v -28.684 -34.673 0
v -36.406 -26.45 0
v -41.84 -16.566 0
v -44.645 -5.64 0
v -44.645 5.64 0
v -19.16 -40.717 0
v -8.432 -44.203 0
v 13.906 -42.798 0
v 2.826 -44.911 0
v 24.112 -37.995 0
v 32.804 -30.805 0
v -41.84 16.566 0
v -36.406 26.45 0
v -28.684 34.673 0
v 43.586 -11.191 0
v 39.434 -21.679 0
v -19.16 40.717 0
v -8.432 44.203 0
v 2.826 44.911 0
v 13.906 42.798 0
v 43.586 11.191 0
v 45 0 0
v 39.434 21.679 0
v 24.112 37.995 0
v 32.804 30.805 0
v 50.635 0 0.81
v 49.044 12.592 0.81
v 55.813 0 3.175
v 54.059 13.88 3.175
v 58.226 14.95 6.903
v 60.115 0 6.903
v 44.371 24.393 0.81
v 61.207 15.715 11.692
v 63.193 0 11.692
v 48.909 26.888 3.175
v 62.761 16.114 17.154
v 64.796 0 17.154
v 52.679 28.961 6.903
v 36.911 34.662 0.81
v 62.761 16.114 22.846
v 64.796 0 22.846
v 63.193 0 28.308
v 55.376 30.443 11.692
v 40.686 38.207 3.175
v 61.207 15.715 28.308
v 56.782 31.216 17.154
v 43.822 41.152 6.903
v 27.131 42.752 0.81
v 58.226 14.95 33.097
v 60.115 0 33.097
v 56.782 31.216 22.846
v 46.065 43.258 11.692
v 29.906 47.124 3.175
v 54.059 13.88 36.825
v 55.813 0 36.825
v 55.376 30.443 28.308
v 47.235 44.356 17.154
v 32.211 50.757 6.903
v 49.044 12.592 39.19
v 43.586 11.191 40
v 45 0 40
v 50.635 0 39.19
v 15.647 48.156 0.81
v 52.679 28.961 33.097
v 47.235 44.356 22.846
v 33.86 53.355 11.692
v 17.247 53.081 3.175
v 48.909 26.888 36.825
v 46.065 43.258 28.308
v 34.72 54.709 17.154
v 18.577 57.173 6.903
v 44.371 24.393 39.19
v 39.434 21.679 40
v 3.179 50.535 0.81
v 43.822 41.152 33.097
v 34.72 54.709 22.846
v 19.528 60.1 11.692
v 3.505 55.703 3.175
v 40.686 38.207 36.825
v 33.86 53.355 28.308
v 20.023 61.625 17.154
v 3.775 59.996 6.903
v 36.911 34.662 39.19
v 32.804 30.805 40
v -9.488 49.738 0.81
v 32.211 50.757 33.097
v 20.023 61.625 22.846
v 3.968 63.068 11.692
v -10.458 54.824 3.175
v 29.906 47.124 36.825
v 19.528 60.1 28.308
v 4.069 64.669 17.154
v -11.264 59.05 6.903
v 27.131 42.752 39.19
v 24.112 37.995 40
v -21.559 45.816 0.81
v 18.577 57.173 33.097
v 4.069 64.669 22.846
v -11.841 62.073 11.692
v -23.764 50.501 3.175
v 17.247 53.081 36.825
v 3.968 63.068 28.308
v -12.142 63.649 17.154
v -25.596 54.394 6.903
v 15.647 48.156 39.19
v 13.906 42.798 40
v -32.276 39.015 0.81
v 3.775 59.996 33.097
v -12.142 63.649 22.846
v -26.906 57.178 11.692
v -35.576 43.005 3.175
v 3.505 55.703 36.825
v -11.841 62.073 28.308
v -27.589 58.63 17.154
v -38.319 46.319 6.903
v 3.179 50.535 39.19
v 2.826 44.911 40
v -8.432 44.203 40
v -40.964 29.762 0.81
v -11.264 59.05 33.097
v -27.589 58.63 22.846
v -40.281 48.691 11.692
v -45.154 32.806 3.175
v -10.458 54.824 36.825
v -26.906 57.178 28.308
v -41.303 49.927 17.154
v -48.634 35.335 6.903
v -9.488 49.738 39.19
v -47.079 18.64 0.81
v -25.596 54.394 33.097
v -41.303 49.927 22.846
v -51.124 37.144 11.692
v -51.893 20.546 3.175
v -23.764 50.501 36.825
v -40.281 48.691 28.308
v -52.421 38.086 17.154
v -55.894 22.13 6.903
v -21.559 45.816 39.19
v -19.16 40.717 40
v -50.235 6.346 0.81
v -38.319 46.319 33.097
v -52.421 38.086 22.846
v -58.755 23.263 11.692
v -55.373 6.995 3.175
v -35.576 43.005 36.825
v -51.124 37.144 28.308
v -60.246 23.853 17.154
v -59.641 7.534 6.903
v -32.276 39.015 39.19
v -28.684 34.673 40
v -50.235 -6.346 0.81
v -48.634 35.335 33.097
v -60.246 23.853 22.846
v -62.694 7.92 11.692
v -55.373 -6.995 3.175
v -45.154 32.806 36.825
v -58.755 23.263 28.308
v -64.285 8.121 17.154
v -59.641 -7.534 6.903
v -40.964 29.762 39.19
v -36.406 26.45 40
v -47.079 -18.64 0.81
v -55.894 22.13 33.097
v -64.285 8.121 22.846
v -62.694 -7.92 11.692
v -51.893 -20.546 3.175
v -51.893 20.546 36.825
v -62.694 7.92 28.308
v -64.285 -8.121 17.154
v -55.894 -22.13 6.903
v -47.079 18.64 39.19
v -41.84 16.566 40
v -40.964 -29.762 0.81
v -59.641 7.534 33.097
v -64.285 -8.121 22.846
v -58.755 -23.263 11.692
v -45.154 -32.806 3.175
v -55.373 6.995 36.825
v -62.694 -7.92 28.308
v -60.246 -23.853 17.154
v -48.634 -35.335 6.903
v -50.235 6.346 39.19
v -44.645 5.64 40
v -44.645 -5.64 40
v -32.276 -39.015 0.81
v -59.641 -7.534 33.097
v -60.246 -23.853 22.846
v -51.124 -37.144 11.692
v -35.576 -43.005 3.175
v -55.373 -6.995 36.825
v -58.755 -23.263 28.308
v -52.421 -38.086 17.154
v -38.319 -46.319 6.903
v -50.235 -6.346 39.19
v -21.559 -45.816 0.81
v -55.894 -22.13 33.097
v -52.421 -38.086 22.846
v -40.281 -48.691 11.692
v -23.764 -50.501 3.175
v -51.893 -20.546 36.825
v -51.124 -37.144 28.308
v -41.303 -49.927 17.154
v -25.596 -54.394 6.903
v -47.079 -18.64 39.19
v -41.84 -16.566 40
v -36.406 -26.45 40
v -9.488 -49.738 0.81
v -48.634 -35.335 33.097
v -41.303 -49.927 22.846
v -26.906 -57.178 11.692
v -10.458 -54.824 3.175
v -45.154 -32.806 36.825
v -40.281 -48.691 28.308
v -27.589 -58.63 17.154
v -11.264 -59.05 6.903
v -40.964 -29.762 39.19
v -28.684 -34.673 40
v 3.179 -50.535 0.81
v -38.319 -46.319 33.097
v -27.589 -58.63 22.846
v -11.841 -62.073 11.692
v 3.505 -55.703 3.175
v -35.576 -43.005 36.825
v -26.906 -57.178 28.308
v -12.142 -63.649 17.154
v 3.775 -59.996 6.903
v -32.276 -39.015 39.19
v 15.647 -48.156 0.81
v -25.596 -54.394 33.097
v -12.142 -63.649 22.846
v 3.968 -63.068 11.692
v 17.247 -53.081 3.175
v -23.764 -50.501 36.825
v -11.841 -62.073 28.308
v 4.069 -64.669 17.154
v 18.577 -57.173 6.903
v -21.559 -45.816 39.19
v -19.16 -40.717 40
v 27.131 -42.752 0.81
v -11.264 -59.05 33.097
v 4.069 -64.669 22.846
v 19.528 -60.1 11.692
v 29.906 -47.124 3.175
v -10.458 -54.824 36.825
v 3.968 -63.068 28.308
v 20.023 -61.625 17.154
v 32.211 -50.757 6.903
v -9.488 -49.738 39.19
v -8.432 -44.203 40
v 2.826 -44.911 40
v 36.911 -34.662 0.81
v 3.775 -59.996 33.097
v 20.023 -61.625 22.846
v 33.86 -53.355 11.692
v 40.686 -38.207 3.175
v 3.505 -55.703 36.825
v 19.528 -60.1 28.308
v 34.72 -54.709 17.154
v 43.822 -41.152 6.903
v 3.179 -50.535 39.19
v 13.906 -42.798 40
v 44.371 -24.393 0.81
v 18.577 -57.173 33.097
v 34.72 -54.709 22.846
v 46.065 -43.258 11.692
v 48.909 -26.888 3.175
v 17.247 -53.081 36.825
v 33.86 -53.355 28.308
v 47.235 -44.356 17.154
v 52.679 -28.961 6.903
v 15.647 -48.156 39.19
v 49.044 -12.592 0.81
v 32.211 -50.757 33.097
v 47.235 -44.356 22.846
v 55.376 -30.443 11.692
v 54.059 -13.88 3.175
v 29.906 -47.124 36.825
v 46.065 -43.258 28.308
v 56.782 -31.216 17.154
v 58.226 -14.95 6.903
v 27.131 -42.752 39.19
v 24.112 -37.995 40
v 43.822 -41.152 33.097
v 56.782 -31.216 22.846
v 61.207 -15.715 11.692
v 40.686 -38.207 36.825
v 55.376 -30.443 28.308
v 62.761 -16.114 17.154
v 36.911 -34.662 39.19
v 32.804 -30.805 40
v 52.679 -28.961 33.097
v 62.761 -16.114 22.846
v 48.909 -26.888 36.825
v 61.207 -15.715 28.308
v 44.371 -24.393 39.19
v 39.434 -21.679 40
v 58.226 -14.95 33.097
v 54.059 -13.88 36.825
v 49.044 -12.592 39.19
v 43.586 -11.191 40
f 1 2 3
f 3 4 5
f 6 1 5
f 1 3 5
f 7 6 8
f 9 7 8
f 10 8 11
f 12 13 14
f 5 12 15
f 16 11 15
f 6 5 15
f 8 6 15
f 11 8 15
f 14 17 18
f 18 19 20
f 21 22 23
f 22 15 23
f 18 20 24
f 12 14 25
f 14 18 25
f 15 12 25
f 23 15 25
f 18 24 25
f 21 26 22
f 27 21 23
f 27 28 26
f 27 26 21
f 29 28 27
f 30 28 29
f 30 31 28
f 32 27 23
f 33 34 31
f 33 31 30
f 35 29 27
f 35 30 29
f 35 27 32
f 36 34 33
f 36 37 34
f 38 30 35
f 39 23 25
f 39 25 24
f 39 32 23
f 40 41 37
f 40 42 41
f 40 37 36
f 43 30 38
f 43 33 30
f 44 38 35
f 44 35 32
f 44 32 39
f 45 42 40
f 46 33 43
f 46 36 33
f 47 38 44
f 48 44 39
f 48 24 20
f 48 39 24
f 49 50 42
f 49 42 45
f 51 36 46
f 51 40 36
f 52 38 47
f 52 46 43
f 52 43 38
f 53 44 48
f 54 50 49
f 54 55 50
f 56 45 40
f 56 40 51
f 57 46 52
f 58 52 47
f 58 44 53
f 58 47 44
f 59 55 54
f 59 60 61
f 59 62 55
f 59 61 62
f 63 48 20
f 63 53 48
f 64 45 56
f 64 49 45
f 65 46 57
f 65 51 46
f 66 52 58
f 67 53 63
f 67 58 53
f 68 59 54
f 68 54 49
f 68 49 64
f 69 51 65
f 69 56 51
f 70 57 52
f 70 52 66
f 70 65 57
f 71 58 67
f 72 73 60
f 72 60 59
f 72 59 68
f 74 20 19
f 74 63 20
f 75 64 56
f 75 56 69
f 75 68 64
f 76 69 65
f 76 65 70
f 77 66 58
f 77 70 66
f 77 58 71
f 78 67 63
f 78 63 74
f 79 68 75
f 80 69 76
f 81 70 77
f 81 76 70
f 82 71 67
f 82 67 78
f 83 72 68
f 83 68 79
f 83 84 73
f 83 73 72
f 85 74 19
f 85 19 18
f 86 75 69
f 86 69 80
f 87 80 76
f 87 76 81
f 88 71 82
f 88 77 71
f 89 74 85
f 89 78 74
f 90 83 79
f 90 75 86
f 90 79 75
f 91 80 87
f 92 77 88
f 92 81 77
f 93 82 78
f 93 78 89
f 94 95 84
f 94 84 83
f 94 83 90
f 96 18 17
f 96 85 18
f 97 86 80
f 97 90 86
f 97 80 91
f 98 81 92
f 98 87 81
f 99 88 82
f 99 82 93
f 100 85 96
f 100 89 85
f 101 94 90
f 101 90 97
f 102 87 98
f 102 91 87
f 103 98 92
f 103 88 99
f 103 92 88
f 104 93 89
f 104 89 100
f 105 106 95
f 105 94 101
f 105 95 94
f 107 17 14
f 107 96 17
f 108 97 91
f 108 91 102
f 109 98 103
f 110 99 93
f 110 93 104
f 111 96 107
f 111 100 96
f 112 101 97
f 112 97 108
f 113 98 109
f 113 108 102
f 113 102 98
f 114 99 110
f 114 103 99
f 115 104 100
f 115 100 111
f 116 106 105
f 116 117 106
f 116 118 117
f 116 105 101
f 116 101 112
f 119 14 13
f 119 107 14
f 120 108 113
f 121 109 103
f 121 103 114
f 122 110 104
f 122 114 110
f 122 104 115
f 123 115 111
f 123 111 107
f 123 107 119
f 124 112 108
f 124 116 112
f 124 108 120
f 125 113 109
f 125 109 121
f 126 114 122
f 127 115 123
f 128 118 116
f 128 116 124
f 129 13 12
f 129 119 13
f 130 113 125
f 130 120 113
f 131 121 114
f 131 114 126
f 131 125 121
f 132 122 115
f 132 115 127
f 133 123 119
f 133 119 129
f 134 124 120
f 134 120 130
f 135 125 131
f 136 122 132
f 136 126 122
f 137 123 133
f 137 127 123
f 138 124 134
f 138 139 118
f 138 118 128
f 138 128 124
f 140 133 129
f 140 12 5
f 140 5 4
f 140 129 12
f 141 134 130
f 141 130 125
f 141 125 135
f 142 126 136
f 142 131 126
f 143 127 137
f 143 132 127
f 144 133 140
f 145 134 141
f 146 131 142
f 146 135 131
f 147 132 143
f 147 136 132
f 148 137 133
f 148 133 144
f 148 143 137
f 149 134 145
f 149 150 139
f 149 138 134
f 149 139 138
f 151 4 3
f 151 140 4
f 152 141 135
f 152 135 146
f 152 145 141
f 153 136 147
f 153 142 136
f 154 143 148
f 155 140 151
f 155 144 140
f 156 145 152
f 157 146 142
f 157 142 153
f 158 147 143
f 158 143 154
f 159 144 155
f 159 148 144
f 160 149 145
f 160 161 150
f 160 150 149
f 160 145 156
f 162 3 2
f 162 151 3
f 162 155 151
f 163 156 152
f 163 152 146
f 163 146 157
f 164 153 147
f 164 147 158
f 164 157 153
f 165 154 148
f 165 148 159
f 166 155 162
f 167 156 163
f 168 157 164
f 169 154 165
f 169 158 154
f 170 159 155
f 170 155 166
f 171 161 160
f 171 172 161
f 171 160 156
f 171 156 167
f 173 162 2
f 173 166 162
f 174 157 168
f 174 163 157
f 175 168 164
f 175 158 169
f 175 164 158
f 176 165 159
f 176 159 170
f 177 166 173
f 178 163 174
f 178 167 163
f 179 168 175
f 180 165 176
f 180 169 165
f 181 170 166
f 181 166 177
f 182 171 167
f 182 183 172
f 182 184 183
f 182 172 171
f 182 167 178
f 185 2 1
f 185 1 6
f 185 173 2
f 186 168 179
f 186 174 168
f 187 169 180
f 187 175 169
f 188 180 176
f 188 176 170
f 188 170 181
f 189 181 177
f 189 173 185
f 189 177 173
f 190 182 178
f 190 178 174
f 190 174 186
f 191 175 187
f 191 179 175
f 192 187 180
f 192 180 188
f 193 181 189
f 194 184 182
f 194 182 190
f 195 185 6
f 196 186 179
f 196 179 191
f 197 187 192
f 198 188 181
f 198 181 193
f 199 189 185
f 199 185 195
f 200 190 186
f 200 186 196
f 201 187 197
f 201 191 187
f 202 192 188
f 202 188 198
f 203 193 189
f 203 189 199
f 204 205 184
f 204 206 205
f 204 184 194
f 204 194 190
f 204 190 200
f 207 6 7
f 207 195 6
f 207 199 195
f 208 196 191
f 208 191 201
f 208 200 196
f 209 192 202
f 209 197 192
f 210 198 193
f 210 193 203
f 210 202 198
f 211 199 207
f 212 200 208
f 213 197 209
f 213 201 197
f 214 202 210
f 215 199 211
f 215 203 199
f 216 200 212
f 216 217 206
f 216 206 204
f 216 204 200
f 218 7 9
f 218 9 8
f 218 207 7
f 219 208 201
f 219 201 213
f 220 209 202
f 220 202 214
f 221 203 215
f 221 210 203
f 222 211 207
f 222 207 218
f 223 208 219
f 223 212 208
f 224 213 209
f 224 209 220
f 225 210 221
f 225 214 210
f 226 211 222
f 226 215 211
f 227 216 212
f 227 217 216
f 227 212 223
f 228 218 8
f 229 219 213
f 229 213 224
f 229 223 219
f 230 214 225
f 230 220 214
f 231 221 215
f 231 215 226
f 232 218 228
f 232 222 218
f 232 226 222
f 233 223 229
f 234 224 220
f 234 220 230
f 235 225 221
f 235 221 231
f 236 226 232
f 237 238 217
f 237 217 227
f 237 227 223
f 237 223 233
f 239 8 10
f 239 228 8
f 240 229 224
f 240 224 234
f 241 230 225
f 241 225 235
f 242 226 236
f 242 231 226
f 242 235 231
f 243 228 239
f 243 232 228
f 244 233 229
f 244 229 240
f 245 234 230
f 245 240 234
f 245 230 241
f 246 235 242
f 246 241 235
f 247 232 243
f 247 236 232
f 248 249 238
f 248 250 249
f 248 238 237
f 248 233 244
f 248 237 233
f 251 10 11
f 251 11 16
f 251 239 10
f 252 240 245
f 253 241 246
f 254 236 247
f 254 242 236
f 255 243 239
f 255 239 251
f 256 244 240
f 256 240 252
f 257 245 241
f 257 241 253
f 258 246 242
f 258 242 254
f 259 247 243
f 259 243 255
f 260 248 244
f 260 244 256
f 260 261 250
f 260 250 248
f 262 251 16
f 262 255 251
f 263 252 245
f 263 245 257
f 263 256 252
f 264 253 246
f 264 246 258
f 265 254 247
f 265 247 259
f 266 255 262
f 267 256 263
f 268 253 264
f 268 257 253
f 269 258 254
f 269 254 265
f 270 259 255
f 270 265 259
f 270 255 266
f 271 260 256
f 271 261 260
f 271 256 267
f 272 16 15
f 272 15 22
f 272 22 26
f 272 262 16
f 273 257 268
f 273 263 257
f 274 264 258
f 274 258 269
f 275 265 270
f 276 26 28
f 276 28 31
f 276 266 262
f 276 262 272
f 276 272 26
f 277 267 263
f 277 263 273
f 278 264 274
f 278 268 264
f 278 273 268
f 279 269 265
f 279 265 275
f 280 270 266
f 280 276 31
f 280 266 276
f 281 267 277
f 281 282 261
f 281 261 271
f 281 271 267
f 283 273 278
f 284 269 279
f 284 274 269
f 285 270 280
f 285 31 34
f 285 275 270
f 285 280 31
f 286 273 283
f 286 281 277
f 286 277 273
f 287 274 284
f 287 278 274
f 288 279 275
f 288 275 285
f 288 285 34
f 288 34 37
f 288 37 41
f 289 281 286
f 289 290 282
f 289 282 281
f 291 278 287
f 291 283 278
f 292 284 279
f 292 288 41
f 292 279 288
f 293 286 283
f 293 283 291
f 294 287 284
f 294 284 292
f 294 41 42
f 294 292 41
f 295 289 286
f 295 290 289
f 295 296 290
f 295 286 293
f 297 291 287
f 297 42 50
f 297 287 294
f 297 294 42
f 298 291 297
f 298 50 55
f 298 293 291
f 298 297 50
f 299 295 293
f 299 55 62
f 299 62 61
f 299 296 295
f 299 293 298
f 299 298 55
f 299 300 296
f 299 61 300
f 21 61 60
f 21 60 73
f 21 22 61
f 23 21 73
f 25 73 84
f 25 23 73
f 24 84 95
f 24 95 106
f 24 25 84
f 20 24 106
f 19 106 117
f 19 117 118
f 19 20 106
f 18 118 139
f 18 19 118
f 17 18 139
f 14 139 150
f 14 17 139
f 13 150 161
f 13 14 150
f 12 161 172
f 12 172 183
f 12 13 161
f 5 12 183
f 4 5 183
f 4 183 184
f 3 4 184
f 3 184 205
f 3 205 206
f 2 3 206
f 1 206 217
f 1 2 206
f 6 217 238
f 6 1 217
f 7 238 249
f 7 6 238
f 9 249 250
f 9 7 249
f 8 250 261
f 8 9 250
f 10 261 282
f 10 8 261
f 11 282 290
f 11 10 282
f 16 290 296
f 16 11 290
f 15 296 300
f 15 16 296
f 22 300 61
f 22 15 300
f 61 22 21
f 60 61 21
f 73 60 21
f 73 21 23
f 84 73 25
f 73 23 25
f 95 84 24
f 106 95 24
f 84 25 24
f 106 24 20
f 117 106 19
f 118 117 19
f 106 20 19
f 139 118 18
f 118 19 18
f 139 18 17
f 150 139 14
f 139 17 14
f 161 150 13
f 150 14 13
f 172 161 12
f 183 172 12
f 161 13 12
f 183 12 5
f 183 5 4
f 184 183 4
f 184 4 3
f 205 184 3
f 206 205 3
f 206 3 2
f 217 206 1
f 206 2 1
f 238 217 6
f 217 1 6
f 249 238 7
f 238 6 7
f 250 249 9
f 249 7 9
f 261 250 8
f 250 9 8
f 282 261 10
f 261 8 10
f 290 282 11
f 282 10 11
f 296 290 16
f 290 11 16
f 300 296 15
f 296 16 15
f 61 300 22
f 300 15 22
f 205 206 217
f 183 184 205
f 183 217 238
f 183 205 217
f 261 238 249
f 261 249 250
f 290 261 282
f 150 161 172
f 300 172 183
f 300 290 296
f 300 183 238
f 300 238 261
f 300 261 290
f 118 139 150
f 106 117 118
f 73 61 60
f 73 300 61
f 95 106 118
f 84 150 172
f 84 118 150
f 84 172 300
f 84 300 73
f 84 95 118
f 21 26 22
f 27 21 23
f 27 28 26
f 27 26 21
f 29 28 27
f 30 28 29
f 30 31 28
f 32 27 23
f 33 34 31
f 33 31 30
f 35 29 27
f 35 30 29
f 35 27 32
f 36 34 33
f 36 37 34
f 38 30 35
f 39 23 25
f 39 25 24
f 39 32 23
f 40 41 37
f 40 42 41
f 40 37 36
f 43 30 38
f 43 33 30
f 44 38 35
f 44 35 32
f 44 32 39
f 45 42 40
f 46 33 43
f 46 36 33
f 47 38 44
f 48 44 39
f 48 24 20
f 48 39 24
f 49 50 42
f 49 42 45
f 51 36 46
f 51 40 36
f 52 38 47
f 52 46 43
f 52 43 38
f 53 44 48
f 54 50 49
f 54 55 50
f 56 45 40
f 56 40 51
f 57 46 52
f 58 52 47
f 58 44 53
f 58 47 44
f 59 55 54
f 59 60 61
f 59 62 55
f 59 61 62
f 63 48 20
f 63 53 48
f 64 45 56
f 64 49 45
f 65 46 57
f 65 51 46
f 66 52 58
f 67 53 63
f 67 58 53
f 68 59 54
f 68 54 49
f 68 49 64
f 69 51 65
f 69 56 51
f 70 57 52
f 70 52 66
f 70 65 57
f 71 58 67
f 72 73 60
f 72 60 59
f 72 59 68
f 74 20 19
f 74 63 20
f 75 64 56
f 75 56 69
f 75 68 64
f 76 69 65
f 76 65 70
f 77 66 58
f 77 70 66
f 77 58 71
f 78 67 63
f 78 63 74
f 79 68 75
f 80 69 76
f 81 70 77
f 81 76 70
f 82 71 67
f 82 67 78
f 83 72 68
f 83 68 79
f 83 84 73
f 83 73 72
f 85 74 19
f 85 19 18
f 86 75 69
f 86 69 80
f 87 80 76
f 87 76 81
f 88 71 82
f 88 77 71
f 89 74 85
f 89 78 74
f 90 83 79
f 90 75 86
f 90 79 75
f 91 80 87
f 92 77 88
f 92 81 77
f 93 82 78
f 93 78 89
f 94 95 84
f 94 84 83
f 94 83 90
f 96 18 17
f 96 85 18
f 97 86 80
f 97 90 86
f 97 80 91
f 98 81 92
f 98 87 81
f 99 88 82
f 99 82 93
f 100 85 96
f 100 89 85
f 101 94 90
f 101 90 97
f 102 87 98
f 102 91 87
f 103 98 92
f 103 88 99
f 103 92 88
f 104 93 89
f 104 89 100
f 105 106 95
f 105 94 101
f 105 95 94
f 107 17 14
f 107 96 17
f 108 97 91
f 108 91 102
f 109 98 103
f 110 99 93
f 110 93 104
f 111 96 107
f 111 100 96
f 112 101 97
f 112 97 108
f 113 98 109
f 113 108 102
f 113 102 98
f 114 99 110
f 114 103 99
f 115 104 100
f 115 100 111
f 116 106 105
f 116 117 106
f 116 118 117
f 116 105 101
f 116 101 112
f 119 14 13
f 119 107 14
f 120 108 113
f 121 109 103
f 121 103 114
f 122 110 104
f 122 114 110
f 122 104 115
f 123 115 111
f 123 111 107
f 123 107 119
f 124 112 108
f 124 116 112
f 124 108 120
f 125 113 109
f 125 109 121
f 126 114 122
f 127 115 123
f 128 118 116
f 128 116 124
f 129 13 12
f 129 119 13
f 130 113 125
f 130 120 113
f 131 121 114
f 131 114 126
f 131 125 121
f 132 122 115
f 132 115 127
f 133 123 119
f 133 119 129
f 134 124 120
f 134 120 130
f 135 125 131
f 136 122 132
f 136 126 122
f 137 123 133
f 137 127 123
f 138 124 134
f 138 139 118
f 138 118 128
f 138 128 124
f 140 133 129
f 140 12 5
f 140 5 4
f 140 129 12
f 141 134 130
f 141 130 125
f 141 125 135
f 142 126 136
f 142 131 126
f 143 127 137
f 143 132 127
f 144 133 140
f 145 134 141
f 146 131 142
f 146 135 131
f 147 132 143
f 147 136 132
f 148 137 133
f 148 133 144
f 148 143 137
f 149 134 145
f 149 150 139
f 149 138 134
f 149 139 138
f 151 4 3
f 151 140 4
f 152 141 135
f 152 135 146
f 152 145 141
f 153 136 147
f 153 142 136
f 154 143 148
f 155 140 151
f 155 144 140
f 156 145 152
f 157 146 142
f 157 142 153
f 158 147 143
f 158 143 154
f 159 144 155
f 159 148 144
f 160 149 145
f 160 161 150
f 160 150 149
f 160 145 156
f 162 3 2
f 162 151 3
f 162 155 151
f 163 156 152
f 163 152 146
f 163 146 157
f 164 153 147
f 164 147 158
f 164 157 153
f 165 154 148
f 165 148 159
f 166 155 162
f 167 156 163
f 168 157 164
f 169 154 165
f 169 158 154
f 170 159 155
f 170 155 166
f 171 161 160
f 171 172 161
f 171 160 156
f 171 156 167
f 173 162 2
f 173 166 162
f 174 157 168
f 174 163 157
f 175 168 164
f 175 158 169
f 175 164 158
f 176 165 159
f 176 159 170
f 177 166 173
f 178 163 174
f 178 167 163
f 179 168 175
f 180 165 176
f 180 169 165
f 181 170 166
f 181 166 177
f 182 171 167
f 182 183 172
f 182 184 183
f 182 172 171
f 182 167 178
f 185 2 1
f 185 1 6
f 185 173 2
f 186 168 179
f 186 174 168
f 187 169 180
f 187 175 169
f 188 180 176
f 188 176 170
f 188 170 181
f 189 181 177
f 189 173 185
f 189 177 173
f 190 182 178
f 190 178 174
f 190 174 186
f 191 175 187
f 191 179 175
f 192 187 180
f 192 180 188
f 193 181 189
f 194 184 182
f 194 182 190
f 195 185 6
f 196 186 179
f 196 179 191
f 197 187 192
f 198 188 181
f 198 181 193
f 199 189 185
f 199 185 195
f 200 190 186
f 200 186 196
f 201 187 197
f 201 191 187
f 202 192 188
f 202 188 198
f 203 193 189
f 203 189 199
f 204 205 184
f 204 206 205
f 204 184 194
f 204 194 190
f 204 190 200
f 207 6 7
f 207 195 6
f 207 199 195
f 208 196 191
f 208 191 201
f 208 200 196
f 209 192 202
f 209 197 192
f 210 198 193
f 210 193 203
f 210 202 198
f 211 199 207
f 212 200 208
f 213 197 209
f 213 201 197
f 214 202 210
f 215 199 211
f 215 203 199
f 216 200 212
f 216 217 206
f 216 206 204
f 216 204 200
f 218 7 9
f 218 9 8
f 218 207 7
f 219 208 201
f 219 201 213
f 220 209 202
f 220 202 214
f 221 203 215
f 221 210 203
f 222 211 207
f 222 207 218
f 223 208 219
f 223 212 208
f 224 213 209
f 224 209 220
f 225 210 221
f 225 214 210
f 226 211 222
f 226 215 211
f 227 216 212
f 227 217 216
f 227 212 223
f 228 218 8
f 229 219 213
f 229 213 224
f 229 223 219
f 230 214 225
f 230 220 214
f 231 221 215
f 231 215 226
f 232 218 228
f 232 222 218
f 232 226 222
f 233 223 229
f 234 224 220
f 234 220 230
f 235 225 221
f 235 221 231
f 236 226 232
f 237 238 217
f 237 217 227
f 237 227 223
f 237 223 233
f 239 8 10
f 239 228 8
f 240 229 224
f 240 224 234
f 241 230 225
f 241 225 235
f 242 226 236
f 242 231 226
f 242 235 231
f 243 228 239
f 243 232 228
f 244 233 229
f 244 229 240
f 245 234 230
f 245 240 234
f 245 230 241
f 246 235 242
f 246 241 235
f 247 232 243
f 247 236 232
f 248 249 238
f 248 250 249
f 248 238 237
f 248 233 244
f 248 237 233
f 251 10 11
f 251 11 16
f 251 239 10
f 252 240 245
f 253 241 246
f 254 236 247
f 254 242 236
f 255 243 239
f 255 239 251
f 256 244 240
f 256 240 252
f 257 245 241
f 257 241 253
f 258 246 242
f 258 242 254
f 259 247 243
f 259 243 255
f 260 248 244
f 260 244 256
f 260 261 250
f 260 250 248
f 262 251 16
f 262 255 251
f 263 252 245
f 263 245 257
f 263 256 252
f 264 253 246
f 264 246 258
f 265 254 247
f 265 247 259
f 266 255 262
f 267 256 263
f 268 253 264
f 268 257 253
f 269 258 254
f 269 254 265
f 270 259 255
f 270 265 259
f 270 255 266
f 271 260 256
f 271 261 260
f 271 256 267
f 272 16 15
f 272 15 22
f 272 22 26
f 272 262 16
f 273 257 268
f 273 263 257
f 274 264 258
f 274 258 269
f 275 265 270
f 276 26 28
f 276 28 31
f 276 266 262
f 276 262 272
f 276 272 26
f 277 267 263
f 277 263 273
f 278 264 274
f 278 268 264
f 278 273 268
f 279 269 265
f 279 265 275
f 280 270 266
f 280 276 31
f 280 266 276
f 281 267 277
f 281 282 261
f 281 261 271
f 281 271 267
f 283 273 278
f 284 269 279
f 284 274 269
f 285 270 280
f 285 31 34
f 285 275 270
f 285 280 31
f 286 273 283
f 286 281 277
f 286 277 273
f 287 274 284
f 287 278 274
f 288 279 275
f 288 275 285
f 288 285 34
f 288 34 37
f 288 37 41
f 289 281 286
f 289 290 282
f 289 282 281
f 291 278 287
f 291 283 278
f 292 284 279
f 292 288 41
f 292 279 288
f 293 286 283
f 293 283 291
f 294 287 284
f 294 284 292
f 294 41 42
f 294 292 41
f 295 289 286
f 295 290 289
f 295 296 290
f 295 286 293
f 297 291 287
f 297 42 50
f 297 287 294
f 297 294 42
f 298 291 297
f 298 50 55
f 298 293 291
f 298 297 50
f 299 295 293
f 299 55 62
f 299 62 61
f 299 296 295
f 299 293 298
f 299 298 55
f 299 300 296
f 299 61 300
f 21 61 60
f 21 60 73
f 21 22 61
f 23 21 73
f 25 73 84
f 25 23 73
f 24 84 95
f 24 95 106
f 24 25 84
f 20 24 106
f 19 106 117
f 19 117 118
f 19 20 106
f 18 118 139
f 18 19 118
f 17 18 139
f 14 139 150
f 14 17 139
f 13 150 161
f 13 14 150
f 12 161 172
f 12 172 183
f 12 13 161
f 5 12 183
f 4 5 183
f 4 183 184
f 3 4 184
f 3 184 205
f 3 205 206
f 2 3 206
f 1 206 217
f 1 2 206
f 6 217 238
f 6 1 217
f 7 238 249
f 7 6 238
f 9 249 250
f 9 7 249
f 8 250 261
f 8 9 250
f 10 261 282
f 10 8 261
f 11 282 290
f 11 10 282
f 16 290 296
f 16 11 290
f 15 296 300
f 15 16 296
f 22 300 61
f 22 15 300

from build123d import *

# Parameters (mm, degrees)
CROQUIS1_R              = 45
SALIENTE_EXTRUIR1_DEPTH = 40


# Read off the part's stored shape, not the designer's step: Revolución1
with BuildPart() as part:
    # Croquis1 → Saliente-Extruir1 (new body)
    with BuildSketch(Plane.XY):
        Circle(CROQUIS1_R)
    extrude(amount=SALIENTE_EXTRUIR1_DEPTH)


with BuildPart() as body_2:
    # Revolución1 outline → Revolución1 (revolve)
    with BuildSketch(Plane.XZ):
        with BuildLine():
            ThreePointArc((45, 0), (65, 20), (45, 40))
            Line((45, 40), (45, 0))
        make_face()
    revolve(axis=Axis((0, 0, 0), (0, 0, 1)))


with BuildPart() as body_3:
    # Revoluci_n1 2 outline → Revoluci_n1 2 (revolve)
    with BuildSketch(Plane.XZ):
        with BuildLine():
            ThreePointArc((45, 0), (65, 20), (45, 40))
            Line((45, 40), (45, 0))
        make_face()
    revolve(axis=Axis((0, 0, 0), (0, 0, 1)))


solid = Compound([part.part, body_2.part, body_3.part])
